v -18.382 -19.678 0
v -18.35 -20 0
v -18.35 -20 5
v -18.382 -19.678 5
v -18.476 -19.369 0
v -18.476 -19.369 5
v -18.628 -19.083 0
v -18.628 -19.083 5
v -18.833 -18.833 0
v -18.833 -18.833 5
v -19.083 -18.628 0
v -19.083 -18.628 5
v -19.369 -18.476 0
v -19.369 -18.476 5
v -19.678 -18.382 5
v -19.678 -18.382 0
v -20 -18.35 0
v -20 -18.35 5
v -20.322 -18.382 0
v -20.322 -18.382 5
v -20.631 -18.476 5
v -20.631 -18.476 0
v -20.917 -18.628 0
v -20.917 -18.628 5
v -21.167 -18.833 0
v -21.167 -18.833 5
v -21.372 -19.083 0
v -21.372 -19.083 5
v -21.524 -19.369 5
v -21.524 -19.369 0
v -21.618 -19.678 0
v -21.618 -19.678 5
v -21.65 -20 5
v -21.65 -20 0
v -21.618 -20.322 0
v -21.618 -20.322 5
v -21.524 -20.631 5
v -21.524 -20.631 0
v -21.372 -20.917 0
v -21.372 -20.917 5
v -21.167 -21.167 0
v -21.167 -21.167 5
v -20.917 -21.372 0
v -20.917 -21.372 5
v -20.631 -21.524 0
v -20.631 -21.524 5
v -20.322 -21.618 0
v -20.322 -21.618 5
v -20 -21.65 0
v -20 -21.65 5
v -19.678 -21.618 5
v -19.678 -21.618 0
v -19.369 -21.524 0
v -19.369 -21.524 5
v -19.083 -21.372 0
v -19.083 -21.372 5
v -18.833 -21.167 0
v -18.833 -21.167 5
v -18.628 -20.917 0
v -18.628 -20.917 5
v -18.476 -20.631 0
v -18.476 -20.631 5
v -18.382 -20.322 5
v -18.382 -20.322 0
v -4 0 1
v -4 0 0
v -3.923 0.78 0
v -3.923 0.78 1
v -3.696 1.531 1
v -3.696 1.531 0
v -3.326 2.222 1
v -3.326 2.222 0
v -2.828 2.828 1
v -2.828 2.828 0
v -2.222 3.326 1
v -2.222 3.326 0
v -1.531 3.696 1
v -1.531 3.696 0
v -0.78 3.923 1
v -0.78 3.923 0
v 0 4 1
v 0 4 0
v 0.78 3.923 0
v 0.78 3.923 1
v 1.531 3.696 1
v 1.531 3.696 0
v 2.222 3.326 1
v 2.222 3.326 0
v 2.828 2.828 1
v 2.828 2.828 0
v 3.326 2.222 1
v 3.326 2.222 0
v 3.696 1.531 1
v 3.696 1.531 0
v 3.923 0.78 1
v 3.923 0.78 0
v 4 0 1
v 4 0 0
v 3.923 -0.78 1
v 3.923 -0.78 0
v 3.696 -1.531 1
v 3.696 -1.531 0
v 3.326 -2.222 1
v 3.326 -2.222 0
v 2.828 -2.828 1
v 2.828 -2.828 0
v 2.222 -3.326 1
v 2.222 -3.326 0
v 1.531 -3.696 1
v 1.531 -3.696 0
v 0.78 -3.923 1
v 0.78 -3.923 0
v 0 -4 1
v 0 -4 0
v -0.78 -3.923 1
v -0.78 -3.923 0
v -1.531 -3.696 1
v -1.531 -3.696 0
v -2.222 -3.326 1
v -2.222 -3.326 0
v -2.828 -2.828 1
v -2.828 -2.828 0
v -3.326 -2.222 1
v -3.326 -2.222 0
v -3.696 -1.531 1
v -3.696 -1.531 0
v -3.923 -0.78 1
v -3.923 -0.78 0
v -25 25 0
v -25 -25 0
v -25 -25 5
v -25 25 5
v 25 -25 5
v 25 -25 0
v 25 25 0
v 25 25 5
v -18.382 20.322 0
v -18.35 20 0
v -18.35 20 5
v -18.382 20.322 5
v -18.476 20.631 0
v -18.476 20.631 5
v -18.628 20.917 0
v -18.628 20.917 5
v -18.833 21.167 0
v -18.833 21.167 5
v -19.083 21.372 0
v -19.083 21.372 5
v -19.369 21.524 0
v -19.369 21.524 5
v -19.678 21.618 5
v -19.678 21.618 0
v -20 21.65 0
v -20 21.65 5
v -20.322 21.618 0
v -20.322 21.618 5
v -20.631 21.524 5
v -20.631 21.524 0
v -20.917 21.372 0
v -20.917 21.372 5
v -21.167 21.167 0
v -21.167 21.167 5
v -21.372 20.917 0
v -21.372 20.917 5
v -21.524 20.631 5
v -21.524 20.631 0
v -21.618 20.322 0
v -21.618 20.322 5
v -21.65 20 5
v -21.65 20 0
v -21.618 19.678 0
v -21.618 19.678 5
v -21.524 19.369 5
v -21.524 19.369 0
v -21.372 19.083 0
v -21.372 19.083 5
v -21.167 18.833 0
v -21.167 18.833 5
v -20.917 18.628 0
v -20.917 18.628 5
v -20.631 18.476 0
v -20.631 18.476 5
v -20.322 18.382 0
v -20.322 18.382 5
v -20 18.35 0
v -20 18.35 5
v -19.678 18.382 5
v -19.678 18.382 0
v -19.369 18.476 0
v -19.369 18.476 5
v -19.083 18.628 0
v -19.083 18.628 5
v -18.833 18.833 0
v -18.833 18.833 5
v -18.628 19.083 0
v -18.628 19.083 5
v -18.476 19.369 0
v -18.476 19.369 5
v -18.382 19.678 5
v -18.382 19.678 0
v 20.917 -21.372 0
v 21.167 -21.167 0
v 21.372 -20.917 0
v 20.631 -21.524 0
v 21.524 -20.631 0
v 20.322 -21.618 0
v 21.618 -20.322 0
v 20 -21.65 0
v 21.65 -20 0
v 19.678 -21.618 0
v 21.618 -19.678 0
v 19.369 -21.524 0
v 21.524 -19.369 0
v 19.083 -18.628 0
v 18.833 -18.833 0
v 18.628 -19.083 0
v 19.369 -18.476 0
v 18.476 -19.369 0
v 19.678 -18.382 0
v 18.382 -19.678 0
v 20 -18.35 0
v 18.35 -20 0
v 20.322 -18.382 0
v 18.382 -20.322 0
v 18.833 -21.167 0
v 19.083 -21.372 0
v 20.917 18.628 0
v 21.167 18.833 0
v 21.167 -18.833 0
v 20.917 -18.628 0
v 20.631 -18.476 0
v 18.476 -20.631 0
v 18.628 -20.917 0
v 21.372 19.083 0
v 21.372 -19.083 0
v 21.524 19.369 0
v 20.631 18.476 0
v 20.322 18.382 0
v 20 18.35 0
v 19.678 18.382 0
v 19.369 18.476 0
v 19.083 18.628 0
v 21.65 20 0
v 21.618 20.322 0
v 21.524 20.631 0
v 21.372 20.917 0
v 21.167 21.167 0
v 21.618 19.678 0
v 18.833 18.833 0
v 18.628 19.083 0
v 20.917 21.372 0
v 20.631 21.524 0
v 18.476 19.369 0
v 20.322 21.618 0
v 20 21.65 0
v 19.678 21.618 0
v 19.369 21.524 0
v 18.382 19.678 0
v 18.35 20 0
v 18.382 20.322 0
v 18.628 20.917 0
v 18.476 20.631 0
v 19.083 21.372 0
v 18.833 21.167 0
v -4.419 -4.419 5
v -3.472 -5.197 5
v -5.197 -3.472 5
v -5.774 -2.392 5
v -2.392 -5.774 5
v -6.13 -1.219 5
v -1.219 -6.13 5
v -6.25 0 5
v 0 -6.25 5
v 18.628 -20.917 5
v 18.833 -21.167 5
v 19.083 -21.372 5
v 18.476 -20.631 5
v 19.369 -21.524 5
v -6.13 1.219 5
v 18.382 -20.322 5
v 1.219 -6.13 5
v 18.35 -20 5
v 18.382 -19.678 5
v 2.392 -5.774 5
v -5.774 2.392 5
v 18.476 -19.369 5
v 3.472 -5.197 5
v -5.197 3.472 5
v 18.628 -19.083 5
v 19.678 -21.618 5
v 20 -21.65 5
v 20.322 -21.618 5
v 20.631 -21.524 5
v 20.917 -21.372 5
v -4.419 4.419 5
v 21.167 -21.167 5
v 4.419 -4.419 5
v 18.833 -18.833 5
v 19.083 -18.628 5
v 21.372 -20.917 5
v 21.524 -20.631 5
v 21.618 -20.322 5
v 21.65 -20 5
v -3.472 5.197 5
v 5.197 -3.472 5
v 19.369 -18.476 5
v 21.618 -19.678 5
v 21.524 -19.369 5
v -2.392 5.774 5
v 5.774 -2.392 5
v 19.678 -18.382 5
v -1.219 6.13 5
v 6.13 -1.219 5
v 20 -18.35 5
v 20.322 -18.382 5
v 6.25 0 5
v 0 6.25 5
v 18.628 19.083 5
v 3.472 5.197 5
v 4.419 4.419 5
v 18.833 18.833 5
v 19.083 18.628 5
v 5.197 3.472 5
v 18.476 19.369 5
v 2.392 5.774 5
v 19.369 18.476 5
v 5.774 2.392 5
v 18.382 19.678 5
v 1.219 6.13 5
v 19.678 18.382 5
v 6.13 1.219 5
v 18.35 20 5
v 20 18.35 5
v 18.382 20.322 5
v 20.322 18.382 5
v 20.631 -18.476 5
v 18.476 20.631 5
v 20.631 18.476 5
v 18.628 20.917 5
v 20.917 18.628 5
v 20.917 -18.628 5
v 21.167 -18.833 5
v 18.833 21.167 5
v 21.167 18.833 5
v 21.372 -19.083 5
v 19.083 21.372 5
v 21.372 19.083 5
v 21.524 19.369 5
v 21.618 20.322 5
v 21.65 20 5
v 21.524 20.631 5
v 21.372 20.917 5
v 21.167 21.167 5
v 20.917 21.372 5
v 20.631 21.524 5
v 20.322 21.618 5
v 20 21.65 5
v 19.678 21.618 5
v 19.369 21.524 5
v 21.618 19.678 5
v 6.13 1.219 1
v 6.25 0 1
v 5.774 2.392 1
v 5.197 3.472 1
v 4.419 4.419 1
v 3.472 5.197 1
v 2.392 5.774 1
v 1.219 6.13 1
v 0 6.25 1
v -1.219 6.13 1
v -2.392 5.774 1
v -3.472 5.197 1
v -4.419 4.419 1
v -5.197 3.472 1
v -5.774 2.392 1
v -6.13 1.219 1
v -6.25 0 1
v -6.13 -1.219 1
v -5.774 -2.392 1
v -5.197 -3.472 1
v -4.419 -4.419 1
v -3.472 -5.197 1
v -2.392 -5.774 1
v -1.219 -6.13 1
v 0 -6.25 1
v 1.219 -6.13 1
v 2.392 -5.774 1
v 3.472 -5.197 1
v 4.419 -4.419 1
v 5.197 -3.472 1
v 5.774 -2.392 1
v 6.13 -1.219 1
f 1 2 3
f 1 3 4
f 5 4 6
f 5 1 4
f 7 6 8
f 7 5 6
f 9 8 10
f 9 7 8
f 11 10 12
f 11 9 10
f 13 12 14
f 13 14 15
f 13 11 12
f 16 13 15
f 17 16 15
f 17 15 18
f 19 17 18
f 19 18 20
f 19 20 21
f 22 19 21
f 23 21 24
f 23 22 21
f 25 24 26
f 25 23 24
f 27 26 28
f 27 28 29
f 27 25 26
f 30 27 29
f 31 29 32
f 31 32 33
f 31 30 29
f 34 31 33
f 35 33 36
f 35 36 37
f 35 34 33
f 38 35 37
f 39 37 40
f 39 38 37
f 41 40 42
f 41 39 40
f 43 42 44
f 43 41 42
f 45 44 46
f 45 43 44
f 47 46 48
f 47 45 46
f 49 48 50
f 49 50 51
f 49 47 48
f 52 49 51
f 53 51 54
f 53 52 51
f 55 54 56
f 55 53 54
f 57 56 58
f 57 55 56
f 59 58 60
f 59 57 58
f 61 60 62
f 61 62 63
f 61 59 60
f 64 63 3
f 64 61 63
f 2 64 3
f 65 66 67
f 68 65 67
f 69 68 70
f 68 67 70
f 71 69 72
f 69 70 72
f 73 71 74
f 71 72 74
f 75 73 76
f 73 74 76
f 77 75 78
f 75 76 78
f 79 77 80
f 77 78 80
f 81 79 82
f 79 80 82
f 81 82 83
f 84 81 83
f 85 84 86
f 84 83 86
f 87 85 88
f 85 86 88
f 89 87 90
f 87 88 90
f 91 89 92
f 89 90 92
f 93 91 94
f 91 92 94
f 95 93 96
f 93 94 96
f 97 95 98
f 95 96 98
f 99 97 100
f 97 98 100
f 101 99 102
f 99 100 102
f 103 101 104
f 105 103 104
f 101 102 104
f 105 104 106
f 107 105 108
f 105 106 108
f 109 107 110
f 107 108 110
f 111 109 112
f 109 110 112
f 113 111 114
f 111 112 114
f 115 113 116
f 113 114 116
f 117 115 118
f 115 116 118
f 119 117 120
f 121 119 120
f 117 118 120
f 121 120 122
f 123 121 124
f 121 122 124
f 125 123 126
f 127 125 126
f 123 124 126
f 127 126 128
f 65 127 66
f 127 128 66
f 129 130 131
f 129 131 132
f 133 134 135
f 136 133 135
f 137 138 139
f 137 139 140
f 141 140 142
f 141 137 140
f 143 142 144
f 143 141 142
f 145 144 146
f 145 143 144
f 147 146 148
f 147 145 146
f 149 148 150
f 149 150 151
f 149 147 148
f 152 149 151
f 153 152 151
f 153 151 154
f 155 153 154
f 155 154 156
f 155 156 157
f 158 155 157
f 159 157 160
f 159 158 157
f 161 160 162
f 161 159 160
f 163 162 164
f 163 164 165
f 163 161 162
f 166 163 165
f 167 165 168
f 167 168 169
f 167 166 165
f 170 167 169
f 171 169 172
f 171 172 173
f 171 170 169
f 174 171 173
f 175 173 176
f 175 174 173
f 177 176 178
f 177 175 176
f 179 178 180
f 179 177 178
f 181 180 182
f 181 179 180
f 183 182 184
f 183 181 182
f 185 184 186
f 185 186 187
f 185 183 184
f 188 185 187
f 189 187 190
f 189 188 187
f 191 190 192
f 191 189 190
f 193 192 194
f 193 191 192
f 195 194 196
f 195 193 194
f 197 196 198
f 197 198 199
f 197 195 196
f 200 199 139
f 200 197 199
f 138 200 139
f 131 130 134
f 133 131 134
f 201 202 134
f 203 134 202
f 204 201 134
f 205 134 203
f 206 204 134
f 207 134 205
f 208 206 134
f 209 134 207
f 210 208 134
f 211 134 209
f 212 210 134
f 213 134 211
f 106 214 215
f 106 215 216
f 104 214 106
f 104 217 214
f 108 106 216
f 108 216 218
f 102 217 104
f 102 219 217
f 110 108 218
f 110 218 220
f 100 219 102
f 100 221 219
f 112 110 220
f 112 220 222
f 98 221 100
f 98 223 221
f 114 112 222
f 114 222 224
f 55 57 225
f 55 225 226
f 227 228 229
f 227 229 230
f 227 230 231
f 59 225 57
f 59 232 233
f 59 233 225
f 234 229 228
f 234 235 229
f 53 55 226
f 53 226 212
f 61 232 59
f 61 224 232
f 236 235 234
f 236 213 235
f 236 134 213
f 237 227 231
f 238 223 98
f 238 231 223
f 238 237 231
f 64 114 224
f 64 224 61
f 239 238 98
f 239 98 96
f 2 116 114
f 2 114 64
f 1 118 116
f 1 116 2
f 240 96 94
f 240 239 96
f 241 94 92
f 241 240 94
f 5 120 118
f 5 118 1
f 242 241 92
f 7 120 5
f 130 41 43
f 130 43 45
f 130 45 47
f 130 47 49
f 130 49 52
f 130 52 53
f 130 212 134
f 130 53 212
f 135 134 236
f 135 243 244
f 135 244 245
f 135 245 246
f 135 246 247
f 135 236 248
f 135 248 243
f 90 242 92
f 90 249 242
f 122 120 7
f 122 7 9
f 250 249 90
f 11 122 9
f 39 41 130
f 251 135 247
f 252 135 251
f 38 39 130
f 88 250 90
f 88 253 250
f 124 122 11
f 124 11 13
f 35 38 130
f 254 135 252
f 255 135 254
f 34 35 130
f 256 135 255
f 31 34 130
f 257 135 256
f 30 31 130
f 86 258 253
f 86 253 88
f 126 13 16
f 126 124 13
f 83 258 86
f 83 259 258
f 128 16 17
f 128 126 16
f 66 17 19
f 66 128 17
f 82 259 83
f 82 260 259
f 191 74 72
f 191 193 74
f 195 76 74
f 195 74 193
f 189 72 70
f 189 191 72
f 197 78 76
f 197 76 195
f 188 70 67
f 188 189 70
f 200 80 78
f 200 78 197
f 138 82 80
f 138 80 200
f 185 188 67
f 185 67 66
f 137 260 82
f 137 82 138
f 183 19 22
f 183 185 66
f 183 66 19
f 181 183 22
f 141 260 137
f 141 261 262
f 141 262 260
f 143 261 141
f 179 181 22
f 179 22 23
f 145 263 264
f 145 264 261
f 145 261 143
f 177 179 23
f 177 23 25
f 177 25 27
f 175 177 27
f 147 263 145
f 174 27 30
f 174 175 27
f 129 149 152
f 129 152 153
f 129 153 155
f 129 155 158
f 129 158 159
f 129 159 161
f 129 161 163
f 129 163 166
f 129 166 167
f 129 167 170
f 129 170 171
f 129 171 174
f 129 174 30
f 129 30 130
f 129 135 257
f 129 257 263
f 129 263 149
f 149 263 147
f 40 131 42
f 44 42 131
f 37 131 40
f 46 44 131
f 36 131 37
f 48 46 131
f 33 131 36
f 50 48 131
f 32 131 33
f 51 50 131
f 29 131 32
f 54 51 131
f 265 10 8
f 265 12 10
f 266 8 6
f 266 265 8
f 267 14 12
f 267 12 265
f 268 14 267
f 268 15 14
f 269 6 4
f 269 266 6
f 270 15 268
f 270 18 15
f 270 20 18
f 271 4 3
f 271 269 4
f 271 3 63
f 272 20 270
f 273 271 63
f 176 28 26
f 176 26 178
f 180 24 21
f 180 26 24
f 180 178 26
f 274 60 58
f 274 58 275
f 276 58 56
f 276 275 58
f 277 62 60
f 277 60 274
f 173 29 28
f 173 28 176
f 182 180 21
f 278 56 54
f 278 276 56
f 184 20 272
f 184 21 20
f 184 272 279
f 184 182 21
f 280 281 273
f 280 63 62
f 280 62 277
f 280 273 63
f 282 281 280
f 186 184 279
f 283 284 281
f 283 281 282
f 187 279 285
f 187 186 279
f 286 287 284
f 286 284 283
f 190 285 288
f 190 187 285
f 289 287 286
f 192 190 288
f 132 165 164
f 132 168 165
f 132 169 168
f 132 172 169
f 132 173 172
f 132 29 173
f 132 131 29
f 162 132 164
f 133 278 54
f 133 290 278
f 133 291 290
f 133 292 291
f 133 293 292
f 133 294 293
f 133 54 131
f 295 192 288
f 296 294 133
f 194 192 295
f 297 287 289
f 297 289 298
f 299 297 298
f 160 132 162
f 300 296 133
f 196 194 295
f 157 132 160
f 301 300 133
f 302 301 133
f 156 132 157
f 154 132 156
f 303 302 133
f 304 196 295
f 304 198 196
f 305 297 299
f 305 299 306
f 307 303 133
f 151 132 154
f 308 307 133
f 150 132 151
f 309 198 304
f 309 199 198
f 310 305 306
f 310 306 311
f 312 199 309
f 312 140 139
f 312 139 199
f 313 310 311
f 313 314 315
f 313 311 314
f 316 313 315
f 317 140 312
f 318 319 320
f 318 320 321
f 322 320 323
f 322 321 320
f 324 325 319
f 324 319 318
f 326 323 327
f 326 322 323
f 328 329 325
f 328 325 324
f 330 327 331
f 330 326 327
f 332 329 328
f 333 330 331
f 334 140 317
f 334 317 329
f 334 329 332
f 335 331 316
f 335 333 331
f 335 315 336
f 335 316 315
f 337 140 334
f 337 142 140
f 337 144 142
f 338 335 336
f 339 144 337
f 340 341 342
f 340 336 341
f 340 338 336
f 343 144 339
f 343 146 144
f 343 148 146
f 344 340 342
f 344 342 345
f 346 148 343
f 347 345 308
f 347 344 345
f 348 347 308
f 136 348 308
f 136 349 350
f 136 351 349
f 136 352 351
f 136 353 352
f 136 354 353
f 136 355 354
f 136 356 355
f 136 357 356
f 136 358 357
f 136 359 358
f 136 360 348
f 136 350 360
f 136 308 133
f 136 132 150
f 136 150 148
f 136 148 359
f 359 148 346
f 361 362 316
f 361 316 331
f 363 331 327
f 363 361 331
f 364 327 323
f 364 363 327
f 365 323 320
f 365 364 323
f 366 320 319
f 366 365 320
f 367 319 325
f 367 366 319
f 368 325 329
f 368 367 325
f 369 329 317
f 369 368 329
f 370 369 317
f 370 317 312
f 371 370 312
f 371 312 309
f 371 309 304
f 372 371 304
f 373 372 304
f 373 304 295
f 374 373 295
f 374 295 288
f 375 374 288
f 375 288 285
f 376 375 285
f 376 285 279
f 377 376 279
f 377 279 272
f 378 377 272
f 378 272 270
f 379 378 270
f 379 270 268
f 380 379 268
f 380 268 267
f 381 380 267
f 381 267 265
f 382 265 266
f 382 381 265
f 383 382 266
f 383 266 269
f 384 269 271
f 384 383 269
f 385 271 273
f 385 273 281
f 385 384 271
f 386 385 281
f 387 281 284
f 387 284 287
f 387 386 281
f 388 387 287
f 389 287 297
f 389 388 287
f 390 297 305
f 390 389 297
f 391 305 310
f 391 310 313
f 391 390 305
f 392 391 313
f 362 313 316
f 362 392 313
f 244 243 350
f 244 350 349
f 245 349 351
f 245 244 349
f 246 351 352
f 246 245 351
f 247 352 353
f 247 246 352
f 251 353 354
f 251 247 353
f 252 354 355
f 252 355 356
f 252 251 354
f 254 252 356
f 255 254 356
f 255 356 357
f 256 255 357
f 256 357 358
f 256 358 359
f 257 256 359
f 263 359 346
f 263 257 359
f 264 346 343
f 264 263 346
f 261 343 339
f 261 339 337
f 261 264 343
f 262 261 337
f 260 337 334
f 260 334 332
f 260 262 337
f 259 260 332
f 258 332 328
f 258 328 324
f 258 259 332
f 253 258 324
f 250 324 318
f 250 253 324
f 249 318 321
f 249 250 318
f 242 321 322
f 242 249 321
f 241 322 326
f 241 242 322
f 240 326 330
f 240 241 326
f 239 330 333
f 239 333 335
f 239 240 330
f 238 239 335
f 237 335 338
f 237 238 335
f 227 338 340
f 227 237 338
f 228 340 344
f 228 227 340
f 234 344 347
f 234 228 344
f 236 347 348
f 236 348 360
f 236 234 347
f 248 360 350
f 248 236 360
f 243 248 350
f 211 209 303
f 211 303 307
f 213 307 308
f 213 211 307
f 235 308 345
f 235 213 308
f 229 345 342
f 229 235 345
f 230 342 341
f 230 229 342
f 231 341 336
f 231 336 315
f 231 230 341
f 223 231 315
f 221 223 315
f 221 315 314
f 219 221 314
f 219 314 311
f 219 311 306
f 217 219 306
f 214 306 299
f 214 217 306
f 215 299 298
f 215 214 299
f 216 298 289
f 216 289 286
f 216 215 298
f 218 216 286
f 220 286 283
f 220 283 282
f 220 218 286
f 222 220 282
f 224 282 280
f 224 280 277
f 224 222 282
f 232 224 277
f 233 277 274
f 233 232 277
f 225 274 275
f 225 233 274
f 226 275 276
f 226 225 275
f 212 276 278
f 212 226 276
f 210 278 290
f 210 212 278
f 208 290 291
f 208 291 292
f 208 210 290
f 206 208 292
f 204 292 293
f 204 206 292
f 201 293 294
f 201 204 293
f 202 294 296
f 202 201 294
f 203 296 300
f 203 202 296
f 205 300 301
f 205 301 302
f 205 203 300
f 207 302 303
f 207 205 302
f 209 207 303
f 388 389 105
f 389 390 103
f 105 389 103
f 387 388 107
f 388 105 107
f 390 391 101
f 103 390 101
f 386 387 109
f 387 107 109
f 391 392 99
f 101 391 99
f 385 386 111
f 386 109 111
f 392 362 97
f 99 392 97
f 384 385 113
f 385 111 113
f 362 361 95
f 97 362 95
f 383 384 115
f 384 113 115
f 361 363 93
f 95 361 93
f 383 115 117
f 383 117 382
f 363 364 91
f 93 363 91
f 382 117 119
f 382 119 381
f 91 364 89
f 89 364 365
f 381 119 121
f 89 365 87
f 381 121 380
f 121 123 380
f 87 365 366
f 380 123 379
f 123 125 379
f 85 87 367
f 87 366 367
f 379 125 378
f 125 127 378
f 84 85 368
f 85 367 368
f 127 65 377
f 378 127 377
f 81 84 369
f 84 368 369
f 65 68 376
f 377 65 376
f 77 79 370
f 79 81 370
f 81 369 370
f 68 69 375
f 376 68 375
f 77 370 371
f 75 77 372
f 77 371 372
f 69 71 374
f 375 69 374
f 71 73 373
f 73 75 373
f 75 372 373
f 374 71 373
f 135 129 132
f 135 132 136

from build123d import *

# Parameters (mm, degrees)
SKETCH_1_W      = 50
SKETCH_1_H      = 50
SKETCH_1_R      = 1.65
SKETCH_1_R_2    = 6.25
EXTRUDE_1_DEPTH = 5
SKETCH_2_R      = 6.25
SKETCH_2_R_2    = 4
EXTRUDE_2_DEPTH = 1


with BuildPart() as part:
    # 草图1 → 凸台-拉伸1 (new body)
    with BuildSketch(Plane.XY):
        Rectangle(SKETCH_1_W, SKETCH_1_H)
        with Locations((-20, -20)):
            Circle(SKETCH_1_R, mode=Mode.SUBTRACT)
        with Locations((-20, 20)):
            Circle(SKETCH_1_R, mode=Mode.SUBTRACT)
        with Locations((20, 20)):
            Circle(SKETCH_1_R, mode=Mode.SUBTRACT)
        with Locations((20, -20)):
            Circle(SKETCH_1_R, mode=Mode.SUBTRACT)
        Circle(SKETCH_1_R_2, mode=Mode.SUBTRACT)
    extrude(amount=EXTRUDE_1_DEPTH)

    # 草图2 → 凸台-拉伸2 (add)
    with BuildSketch(Plane(origin=(0, 0, 0), x_dir=(-1, 0, 0), z_dir=(0, 0, -1))):
        Circle(SKETCH_2_R)
        Circle(SKETCH_2_R_2, mode=Mode.SUBTRACT)
    extrude(amount=-EXTRUDE_2_DEPTH)


solid = part.part
